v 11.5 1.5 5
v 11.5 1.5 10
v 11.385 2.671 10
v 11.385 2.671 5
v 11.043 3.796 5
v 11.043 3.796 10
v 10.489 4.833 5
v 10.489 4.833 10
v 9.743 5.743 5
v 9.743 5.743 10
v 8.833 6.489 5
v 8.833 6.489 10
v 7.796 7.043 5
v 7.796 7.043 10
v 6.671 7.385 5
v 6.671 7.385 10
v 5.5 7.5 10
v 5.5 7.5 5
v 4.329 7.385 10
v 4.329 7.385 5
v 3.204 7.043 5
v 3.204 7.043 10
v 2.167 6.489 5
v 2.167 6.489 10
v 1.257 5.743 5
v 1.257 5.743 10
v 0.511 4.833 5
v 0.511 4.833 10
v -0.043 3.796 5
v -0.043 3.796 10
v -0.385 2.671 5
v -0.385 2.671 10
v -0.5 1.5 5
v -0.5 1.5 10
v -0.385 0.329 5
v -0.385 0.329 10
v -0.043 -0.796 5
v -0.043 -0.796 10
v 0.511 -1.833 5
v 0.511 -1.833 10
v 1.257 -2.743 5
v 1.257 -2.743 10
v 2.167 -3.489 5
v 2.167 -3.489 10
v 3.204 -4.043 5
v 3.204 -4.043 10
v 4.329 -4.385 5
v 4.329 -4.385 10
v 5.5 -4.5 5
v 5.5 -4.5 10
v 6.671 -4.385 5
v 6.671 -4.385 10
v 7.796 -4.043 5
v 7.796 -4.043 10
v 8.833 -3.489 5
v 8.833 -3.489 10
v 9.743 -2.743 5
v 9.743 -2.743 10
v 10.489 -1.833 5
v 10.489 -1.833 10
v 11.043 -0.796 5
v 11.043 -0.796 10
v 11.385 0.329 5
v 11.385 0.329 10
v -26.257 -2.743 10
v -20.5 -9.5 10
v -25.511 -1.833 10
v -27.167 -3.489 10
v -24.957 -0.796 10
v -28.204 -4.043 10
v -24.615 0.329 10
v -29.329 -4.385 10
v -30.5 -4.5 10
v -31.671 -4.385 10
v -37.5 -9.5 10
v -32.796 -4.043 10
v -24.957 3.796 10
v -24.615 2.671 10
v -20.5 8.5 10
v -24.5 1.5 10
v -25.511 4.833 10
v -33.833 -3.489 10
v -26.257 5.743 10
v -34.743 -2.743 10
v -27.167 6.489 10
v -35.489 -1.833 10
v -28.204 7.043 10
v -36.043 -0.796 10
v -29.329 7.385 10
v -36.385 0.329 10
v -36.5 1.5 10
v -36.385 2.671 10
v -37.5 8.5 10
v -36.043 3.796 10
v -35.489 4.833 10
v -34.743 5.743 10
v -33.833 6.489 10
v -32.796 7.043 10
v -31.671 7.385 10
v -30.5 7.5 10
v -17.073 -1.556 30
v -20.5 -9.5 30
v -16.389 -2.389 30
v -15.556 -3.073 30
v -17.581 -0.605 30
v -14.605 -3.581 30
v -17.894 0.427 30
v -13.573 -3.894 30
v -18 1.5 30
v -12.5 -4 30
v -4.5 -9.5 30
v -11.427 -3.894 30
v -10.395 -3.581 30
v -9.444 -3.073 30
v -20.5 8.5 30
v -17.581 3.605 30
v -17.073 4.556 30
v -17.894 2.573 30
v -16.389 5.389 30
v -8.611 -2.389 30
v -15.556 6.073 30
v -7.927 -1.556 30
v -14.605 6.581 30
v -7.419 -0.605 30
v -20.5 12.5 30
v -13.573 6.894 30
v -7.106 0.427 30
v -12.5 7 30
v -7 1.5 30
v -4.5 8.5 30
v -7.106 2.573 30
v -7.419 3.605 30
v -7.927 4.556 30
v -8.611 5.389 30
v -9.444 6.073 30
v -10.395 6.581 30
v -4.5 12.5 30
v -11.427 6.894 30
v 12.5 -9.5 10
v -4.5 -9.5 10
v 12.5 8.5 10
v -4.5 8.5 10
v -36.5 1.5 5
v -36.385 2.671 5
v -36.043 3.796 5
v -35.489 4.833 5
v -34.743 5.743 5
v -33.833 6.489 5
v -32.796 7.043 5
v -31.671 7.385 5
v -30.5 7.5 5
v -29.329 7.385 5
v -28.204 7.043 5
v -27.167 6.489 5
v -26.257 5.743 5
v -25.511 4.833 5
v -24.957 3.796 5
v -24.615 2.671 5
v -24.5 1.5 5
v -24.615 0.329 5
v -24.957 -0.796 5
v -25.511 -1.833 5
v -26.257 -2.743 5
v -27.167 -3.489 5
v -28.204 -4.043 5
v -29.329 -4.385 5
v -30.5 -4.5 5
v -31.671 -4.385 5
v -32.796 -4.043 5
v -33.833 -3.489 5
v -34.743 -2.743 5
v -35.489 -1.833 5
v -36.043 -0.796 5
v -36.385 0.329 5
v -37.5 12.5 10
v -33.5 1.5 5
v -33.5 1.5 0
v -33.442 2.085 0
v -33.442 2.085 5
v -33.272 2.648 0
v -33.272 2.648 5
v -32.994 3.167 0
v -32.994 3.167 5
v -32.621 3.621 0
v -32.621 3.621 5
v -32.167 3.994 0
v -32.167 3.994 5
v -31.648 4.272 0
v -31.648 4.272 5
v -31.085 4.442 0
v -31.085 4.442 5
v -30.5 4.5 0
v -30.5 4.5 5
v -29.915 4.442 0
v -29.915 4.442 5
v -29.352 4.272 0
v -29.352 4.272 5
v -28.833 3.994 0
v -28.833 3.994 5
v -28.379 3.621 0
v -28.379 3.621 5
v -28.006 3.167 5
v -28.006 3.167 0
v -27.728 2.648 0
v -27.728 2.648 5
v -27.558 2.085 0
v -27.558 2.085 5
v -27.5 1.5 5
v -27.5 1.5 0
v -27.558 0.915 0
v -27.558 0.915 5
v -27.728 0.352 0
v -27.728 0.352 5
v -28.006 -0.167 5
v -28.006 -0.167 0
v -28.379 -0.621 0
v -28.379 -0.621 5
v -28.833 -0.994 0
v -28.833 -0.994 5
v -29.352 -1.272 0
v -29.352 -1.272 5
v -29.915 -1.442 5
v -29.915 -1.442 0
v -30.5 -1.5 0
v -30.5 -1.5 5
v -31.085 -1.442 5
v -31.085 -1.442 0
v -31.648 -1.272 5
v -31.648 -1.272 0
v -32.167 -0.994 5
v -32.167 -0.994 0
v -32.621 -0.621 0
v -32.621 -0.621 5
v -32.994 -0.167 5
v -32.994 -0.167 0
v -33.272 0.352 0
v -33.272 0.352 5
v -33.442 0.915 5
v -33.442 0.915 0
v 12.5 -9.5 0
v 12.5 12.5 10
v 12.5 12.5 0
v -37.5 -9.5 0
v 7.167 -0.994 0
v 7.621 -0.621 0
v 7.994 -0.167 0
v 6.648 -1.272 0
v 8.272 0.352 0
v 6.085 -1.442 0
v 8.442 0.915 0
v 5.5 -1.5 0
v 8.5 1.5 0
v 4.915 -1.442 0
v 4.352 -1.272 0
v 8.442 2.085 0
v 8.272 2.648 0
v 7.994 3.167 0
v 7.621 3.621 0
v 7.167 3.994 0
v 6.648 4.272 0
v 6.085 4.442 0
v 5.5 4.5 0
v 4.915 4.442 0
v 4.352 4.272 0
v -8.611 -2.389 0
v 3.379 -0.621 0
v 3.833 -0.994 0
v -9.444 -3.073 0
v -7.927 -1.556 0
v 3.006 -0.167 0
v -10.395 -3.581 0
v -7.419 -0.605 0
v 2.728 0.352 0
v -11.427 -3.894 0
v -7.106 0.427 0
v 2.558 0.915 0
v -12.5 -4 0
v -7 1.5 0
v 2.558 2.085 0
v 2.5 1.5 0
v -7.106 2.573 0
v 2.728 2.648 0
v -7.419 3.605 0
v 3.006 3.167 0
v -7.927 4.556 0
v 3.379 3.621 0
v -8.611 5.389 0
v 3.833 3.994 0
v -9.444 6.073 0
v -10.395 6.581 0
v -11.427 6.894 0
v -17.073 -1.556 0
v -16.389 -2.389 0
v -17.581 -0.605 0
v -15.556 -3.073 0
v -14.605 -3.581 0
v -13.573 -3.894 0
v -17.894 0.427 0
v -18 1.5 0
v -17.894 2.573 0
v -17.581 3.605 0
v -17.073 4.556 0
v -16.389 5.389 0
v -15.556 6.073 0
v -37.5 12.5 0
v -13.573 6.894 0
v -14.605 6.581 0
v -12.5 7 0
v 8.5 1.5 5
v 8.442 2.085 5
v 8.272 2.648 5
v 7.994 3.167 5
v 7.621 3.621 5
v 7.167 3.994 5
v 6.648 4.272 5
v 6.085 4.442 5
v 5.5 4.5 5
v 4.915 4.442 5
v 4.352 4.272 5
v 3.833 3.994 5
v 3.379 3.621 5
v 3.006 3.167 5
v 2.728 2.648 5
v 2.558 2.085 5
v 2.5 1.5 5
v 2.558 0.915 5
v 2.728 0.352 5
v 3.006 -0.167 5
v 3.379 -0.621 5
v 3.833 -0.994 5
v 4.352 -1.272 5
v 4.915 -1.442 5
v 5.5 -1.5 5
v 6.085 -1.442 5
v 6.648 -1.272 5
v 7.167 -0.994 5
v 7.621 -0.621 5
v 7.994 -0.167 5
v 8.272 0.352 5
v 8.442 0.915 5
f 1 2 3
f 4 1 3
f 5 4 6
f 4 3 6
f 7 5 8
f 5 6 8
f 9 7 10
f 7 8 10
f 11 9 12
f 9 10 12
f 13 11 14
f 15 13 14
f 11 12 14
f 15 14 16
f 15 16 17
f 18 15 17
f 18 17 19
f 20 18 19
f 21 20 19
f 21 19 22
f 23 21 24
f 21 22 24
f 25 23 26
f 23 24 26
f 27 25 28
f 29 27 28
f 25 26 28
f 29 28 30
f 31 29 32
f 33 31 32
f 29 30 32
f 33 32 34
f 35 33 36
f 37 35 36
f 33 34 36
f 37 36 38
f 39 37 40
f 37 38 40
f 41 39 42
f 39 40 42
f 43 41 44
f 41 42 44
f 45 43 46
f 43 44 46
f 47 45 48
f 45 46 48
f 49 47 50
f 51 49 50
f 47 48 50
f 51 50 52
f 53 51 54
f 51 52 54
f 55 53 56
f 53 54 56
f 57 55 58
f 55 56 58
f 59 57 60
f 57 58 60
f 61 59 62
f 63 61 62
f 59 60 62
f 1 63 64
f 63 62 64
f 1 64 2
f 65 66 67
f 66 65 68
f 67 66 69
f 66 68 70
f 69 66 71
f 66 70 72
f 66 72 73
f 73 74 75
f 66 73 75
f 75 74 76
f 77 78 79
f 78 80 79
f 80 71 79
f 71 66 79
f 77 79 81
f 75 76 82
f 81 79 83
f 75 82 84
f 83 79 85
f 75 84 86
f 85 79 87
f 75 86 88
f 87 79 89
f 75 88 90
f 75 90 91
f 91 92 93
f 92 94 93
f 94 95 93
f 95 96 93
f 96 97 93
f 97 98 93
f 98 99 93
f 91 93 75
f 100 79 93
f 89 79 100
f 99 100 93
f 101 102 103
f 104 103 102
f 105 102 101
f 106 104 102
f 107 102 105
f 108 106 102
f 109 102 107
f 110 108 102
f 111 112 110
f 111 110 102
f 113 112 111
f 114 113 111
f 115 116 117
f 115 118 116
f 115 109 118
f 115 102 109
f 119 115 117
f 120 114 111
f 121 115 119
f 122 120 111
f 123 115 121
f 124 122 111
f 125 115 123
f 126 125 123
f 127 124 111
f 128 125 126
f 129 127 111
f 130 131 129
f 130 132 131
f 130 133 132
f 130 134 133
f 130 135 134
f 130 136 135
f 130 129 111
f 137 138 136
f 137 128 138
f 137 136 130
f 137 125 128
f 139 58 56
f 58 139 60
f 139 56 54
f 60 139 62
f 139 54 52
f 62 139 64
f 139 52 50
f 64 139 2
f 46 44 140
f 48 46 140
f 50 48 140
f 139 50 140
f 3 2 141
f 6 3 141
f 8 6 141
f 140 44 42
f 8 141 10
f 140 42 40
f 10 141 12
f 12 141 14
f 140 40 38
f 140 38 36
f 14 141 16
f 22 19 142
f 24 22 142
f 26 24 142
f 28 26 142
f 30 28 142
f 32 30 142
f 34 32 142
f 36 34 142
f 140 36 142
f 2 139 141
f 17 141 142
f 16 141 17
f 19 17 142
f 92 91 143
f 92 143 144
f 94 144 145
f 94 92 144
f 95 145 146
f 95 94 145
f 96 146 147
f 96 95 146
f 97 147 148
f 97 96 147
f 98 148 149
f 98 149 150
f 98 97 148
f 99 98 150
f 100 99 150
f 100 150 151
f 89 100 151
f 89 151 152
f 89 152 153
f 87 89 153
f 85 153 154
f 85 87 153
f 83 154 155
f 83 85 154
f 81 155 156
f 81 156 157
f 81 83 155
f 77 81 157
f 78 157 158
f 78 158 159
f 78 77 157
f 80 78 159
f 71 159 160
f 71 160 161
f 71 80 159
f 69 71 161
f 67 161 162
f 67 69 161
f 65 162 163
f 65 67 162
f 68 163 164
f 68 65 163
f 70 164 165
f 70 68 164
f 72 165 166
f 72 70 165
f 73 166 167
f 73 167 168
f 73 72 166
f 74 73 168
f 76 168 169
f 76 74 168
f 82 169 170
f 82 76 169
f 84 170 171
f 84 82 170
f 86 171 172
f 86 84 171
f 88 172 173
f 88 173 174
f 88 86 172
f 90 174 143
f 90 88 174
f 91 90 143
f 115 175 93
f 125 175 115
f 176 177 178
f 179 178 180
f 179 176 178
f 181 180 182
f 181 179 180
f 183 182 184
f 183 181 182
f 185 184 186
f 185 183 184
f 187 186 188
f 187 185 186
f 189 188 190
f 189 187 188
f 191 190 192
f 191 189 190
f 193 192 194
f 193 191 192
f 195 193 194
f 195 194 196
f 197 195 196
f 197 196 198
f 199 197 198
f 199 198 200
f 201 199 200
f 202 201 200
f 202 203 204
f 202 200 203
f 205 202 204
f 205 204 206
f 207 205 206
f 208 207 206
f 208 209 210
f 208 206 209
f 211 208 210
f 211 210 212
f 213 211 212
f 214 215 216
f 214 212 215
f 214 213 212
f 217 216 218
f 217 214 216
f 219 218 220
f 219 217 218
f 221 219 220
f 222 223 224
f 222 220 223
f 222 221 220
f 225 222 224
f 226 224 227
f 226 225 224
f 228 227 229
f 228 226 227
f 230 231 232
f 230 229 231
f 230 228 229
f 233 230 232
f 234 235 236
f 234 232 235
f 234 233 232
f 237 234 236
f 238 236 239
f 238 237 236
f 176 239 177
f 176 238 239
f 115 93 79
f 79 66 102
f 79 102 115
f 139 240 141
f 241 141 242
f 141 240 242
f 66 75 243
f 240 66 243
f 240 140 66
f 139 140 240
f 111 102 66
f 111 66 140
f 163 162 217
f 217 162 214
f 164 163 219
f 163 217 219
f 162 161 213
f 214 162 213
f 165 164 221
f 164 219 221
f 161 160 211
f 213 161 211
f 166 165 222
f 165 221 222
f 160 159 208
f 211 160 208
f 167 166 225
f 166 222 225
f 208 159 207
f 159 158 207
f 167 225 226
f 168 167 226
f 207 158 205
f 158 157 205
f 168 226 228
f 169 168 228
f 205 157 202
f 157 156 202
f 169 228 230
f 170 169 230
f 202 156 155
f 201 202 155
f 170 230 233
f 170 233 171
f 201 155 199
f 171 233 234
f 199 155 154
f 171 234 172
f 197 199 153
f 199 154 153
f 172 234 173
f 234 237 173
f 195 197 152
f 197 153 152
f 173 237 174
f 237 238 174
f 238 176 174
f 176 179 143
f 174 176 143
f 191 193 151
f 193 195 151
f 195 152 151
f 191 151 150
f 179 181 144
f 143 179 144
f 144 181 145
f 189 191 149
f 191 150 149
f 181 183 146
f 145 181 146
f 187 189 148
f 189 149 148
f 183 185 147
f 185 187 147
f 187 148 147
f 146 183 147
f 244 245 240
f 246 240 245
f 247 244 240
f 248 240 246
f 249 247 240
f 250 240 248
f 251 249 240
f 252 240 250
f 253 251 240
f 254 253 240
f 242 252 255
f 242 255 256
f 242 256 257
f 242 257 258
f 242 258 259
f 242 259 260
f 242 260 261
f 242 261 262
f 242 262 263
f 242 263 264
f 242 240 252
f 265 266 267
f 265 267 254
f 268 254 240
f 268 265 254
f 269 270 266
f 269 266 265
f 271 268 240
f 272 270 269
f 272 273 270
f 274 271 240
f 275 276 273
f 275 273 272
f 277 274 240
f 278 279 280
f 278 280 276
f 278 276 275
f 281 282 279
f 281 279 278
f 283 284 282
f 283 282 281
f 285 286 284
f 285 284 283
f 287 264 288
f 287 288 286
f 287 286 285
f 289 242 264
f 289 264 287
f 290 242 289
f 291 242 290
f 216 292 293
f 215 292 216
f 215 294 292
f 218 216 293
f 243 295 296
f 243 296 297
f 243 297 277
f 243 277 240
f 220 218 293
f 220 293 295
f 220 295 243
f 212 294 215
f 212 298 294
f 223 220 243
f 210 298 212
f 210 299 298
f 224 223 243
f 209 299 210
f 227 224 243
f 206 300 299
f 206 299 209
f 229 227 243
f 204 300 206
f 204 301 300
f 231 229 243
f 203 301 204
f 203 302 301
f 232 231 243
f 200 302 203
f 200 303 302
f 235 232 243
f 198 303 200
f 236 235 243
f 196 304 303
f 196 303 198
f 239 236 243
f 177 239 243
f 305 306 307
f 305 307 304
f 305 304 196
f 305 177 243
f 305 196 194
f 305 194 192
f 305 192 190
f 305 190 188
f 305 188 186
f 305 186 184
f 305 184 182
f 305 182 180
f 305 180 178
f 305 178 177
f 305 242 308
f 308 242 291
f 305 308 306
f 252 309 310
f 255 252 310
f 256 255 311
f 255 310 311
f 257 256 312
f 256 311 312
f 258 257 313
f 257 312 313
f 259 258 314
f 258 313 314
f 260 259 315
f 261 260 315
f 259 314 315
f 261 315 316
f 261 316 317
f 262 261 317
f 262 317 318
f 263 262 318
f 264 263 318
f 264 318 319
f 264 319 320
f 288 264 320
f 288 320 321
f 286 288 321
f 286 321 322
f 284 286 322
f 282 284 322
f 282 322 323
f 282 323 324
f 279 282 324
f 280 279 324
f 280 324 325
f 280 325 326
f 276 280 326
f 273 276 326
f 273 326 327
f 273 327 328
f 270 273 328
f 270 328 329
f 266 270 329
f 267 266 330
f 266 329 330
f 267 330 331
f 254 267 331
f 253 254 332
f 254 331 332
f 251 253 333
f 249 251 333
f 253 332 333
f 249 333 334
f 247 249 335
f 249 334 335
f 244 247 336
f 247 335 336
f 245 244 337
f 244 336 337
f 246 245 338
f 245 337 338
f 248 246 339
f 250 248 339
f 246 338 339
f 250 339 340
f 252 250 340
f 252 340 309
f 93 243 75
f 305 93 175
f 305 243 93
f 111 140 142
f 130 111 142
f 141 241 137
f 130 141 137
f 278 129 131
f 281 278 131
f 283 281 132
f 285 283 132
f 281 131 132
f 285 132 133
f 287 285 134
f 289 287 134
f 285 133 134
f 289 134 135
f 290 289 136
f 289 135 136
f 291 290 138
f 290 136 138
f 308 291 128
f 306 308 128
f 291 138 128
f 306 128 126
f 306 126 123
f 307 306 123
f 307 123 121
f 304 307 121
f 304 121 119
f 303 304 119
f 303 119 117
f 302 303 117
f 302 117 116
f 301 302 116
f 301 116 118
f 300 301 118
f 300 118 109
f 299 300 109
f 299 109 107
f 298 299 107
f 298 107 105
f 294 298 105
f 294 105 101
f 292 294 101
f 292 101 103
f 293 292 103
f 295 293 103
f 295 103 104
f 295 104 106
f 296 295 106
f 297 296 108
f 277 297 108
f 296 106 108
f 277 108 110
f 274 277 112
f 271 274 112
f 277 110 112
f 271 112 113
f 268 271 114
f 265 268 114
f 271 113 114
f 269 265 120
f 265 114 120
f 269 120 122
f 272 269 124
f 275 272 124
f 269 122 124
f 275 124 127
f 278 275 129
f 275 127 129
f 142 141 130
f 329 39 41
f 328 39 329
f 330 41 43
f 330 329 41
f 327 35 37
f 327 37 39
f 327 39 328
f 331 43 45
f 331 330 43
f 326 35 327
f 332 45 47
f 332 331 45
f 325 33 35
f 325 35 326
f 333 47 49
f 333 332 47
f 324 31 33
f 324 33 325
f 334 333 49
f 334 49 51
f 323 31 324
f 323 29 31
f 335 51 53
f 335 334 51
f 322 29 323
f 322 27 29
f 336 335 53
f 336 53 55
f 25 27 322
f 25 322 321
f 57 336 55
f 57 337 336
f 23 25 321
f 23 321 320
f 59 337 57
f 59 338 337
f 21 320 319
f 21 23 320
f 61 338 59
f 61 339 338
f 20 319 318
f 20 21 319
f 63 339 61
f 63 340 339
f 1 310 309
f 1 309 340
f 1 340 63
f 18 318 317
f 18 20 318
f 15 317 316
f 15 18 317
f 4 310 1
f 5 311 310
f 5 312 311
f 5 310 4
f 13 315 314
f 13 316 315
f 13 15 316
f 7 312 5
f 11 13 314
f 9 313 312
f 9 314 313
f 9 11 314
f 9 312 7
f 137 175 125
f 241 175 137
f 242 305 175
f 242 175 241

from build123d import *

# Parameters (mm, degrees)
SKETCH_1_W          = 8
SKETCH_1_H          = 22
EXTRUDE_1_DEPTH     = 10
SKETCH_1_3_W        = 8
SKETCH_1_3_H        = 22
EXTRUDE_2_DEPTH     = 30
EXTRUDE_3_DEPTH     = 4
SKETCH_3_R          = 6
CUT_EXTRUDE_1_DEPTH = 5
SKETCH_4_R          = 3
CUT_EXTRUDE_2_DEPTH = 31.618621785
SKETCH_5_R          = 5.5
CUT_EXTRUDE_3_DEPTH = 50.623583103
SKETCH_6_W          = 50
SKETCH_6_H          = 10
CUT_EXTRUDE_4_DEPTH = 3


with BuildPart() as part:
    # Эскиз1 → Бобышка-Вытянуть1 (new body)
    with BuildSketch(Plane.XY):
        Polygon((-12.5, -9.5), (-12.5, -12.5), (12.5, -12.5), (12.5, 12.5), (-4.5, 12.5), (-4.5, -9.5), align=None)
        with Locations((-8.5, 1.5)):
            Rectangle(SKETCH_1_W, SKETCH_1_H)
    extrude_1 = extrude(amount=EXTRUDE_1_DEPTH)

    # Эскиз1<3> → Бобышка-Вытянуть2 (add)
    with BuildSketch(Plane.XY):
        with Locations((-8.5, 1.5)):
            Rectangle(SKETCH_1_3_W, SKETCH_1_3_H)
    extrude_2 = extrude(amount=EXTRUDE_2_DEPTH)

    # Эскиз2 → Бобышка-Вытянуть3 (add)
    with BuildSketch(Plane(origin=(0, 12.5, 0), x_dir=(1, 0, 0), z_dir=(0, 1, 0))):
        Polygon((12.5, -10), (-4.5, -30), (-4.5, -10), align=None)
    extrude_3 = extrude(amount=-EXTRUDE_3_DEPTH)

    # Эскиз3 → Вырез-Вытянуть1 (cut)
    with BuildSketch(Plane.XY.offset(10)):
        with Locations((5.5, 1.5)):
            Circle(SKETCH_3_R)
    cut_extrude_1 = extrude(amount=-CUT_EXTRUDE_1_DEPTH, mode=Mode.SUBTRACT)

    # Эскиз4 → Вырез-Вытянуть2 (cut, through all)
    with BuildSketch(Plane.XY.offset(5)):
        with Locations((5.5, 1.5)):
            Circle(SKETCH_4_R)
    cut_extrude_2 = extrude(amount=-CUT_EXTRUDE_2_DEPTH, mode=Mode.SUBTRACT)

    # Зеркальное отражение1: Бобышка-Вытянуть1, Бобышка-Вытянуть2, Бобышка-Вытянуть3, Вырез-Вытянуть1, Вырез-Вытянуть2 across plane
    add(extrude_1.mirror(Plane(origin=(-12.5, 0, 10), x_dir=(0, 0, 1), z_dir=(-1, 0, 0))))
    add(extrude_2.mirror(Plane(origin=(-12.5, 0, 10), x_dir=(0, 0, 1), z_dir=(-1, 0, 0))))
    add(extrude_3.mirror(Plane(origin=(-12.5, 0, 10), x_dir=(0, 0, 1), z_dir=(-1, 0, 0))))
    add(cut_extrude_1.mirror(Plane(origin=(-12.5, 0, 10), x_dir=(0, 0, 1), z_dir=(-1, 0, 0))), mode=Mode.SUBTRACT)
    add(cut_extrude_2.mirror(Plane(origin=(-12.5, 0, 10), x_dir=(0, 0, 1), z_dir=(-1, 0, 0))), mode=Mode.SUBTRACT)

    # Эскиз5 → Вырез-Вытянуть3 (cut, through all)
    with BuildSketch(Plane.XY.offset(30)):
        with Locations((-12.5, 1.5)):
            Circle(SKETCH_5_R)
    extrude(amount=-CUT_EXTRUDE_3_DEPTH, mode=Mode.SUBTRACT)

    # Эскиз6 → Вырез-Вытянуть4 (cut)
    with BuildSketch(Plane.XZ.offset(12.5)):
        with Locations((-12.5, 5)):
            Rectangle(SKETCH_6_W, SKETCH_6_H)
    extrude(amount=-CUT_EXTRUDE_4_DEPTH, mode=Mode.SUBTRACT)


solid = part.part
